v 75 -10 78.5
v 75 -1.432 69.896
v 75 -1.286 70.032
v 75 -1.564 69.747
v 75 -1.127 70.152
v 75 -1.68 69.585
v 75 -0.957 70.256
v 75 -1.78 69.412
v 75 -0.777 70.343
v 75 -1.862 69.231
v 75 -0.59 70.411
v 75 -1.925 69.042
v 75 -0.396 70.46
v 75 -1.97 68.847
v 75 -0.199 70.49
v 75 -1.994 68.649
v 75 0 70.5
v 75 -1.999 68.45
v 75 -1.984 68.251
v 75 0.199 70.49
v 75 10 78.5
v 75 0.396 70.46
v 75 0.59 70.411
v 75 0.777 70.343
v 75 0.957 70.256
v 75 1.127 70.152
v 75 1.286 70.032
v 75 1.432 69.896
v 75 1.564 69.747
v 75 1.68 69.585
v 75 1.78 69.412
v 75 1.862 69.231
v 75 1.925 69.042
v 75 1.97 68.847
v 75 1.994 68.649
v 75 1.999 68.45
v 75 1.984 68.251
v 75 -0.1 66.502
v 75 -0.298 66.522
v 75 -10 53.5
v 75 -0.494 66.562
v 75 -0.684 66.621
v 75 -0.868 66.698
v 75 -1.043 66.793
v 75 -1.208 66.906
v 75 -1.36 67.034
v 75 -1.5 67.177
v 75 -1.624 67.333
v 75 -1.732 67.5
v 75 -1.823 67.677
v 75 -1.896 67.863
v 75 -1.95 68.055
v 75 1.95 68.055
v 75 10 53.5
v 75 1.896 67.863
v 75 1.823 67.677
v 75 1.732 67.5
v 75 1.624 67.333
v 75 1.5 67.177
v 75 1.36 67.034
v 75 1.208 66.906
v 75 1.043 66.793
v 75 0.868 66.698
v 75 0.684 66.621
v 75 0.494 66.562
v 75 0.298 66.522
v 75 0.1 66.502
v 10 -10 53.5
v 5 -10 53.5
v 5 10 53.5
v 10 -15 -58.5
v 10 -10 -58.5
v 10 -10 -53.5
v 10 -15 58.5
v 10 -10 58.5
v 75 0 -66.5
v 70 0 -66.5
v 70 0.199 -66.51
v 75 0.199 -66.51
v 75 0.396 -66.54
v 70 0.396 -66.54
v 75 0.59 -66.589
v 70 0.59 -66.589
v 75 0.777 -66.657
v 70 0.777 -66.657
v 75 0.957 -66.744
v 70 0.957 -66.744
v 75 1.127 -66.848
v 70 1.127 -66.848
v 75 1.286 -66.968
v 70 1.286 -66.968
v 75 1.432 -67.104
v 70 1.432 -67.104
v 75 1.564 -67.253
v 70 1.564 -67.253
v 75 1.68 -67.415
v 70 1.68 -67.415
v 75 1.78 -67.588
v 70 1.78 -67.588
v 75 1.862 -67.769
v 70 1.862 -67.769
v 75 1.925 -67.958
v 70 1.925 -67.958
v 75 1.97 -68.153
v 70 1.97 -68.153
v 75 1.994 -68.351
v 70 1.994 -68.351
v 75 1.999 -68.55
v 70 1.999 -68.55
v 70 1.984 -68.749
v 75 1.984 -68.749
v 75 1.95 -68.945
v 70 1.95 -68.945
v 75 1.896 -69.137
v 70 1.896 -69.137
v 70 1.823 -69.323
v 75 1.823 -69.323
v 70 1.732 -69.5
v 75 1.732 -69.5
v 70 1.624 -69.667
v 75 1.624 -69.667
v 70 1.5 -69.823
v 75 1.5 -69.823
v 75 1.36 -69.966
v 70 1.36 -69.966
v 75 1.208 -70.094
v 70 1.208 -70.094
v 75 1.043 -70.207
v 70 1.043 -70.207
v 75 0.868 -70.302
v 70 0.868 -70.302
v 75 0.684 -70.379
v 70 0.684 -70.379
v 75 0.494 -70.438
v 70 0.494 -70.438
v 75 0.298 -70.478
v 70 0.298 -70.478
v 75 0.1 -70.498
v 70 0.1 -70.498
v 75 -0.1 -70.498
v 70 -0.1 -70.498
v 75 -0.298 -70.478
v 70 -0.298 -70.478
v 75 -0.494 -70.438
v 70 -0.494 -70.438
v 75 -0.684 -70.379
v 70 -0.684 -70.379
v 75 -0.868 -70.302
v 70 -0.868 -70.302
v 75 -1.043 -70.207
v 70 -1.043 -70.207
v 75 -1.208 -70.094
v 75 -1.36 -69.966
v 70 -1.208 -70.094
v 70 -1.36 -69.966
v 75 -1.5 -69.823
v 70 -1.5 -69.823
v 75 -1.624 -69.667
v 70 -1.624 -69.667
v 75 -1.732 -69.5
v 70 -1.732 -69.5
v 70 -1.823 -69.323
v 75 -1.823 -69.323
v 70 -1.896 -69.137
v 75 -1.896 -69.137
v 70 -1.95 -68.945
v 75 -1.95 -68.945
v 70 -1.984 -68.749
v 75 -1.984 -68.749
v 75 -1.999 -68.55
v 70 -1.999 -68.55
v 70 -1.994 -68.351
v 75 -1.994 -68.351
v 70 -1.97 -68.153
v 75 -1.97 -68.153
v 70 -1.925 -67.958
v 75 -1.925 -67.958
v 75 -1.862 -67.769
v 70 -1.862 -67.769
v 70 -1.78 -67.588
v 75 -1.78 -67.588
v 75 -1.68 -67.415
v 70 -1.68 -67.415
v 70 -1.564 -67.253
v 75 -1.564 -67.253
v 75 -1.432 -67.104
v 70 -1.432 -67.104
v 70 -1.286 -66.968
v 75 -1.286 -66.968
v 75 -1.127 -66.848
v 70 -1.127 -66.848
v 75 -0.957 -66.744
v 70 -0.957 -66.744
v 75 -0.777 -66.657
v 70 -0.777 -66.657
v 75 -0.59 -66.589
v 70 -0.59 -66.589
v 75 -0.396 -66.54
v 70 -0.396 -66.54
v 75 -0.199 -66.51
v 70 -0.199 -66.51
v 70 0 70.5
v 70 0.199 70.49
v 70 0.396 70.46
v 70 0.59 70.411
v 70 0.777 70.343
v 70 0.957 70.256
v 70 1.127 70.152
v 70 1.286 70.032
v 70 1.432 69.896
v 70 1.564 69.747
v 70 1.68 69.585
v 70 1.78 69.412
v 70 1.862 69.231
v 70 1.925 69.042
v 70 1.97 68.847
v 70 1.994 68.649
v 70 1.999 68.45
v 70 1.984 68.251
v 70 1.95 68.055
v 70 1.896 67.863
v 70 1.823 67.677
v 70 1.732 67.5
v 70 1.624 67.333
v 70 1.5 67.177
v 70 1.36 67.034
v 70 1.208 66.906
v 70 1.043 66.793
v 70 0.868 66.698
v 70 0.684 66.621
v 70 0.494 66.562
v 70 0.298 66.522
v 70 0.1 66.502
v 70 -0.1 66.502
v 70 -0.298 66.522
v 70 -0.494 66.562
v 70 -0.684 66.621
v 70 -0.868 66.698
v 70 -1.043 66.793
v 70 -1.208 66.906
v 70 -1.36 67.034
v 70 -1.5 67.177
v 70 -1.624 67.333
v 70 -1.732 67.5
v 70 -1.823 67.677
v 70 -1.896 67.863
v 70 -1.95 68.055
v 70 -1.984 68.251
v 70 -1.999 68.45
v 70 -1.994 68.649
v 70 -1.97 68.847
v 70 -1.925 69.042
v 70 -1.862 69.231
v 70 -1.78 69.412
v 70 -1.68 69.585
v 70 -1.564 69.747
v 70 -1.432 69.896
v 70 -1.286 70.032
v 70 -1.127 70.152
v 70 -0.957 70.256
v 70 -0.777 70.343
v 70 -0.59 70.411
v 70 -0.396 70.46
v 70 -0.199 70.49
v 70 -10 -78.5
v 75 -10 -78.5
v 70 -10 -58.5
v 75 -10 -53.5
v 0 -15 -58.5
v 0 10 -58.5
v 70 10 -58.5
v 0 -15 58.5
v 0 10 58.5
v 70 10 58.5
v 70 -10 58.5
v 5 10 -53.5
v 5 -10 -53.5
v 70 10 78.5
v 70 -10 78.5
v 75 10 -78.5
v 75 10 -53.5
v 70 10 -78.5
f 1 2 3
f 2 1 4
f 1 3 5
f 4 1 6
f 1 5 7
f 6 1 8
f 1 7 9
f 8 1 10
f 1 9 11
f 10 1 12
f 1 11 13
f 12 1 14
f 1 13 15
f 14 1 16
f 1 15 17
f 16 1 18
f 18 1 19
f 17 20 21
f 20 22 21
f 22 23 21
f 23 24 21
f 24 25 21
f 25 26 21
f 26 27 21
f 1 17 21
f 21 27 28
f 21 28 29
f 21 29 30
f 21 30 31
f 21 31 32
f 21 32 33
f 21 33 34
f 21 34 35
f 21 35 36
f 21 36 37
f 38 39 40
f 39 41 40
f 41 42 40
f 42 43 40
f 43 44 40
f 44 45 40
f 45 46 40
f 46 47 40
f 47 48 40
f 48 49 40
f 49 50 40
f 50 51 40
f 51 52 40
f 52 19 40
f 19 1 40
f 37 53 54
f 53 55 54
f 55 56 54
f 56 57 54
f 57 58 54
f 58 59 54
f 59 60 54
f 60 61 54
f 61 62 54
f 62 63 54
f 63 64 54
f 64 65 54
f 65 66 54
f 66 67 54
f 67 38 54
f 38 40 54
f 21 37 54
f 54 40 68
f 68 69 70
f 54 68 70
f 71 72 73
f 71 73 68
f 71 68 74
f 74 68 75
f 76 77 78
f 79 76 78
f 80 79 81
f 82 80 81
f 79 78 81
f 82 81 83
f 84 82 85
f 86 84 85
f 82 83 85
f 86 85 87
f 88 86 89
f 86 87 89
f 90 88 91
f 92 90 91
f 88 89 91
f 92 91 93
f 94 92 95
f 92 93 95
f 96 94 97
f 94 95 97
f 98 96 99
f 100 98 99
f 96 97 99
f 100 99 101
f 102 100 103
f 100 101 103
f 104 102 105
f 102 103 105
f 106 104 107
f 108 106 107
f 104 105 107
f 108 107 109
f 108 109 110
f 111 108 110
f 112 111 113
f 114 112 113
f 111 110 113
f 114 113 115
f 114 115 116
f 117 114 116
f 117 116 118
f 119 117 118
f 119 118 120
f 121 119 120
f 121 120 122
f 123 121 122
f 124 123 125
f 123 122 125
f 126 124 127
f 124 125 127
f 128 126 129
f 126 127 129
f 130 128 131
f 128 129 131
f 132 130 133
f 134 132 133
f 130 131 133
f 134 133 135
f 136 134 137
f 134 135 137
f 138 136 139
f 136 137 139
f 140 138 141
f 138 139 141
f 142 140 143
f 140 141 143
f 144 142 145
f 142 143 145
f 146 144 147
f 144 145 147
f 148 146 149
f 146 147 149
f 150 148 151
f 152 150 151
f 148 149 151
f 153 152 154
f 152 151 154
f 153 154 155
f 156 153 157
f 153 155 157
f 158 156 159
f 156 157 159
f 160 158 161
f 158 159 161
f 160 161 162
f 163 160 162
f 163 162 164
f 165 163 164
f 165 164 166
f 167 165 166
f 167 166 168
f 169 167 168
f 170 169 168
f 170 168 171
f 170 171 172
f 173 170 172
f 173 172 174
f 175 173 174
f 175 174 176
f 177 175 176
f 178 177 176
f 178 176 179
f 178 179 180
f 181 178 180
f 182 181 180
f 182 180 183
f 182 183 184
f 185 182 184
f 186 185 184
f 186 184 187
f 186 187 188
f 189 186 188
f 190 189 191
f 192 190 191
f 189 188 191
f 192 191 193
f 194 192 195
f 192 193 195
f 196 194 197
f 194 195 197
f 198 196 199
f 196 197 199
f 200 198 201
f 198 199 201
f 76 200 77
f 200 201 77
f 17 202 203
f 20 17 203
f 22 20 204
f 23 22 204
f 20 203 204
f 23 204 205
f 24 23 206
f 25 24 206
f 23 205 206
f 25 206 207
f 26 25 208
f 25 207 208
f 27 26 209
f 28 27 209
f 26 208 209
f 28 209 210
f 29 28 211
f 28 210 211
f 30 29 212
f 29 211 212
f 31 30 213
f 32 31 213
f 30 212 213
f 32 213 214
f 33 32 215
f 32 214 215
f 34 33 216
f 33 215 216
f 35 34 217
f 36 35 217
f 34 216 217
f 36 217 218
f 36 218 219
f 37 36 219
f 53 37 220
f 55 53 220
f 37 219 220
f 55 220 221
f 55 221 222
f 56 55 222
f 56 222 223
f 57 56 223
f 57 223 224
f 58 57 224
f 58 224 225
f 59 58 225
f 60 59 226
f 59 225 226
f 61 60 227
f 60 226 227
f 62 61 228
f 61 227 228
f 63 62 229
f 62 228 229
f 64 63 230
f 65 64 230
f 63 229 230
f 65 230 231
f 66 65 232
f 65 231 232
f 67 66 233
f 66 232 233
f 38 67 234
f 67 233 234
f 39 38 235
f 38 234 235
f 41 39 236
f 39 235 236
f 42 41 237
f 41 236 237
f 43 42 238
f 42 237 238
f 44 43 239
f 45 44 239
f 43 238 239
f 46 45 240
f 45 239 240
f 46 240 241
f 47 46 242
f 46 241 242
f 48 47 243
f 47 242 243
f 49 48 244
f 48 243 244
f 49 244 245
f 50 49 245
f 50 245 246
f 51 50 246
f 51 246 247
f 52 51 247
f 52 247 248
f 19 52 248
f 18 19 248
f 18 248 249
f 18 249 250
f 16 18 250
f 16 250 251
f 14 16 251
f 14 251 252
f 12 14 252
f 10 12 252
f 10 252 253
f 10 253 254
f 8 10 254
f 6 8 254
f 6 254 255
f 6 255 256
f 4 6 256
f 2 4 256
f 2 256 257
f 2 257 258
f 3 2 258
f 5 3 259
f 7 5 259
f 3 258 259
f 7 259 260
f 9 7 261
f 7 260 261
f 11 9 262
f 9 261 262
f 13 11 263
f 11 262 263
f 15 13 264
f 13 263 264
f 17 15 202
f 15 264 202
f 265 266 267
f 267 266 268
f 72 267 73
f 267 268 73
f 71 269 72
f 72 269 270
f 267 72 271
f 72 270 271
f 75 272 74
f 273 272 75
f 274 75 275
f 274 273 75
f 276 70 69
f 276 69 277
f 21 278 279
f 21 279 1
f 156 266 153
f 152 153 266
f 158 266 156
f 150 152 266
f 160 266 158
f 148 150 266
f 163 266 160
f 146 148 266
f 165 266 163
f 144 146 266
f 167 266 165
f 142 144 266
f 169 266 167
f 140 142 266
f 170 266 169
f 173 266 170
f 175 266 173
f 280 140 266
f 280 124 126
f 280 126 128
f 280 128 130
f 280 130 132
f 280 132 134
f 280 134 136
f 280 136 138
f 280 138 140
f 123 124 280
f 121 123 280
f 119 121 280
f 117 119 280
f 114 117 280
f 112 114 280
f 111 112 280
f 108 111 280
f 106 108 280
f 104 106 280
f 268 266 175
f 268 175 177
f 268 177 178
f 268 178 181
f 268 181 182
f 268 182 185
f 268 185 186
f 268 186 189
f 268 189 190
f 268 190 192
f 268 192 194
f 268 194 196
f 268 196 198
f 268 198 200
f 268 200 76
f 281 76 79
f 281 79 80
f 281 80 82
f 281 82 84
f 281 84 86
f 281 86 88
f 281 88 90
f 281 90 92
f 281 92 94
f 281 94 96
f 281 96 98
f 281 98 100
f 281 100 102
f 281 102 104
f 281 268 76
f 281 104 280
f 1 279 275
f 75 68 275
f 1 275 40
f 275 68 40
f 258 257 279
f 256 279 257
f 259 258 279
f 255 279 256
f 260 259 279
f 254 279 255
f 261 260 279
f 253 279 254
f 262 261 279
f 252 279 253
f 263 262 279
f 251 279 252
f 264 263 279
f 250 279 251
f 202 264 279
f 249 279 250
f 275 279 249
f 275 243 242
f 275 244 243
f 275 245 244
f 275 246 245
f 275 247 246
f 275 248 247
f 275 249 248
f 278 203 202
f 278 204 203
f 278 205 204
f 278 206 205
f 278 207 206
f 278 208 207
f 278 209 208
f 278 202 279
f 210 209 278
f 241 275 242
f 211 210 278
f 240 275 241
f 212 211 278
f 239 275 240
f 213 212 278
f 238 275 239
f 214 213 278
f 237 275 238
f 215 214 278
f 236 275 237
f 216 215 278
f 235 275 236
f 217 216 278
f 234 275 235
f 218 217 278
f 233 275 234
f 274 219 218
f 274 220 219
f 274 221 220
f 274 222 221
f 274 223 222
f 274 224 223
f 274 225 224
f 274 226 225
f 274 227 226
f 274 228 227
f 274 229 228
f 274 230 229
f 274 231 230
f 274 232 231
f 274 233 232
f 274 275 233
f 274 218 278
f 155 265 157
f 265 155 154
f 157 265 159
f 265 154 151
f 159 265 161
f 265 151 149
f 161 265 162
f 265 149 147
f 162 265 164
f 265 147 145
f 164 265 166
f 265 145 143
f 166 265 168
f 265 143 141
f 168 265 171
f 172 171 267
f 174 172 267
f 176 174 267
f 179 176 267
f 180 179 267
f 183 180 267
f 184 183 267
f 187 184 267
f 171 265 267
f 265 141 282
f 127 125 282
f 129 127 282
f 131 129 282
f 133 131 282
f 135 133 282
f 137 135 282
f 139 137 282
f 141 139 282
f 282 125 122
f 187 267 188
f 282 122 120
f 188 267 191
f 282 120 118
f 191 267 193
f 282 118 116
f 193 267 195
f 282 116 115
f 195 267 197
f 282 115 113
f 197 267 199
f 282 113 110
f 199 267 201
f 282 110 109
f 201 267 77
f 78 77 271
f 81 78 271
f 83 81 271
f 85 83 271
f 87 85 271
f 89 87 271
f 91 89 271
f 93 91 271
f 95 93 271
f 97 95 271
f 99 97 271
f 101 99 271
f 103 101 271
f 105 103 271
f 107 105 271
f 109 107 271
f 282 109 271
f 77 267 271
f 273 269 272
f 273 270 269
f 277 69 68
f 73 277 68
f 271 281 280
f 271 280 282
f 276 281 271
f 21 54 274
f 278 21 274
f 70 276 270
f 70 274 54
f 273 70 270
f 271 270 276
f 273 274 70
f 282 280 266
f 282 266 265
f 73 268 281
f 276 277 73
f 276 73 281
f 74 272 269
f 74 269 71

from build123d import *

# Parameters (mm, degrees)
SKETCH1_W           = 117
SKETCH1_H           = 20
BOSS_EXTRUDE1_DEPTH = 5
SKETCH2_W           = 5
SKETCH2_H           = 20
BOSS_EXTRUDE2_DEPTH = 70
SKETCH3_W           = 10
SKETCH3_H           = 117
BOSS_EXTRUDE3_DEPTH = 5
SKETCH4_W           = 5
SKETCH4_H           = 20
BOSS_EXTRUDE4_DEPTH = 20
SKETCH5_W           = 5
SKETCH5_H           = 20
BOSS_EXTRUDE5_DEPTH = 20
SKETCH6_R           = 2
CUT_EXTRUDE1_DEPTH  = 5


with BuildPart() as part:
    # Sketch1 → Boss-Extrude1 (new body)
    with BuildSketch(Plane(origin=(0, 0, 0), x_dir=(0, 0, -1), z_dir=(1, 0, 0))):
        Rectangle(SKETCH1_W, SKETCH1_H)
    extrude(amount=BOSS_EXTRUDE1_DEPTH)

    # Sketch2 → Boss-Extrude2 (add)
    with BuildSketch(Plane(origin=(5, 0, 0), x_dir=(0, 0, -1), z_dir=(1, 0, 0))):
        with Locations((-56, 0)):
            Rectangle(SKETCH2_W, SKETCH2_H)
        with Locations((56, 0)):
            Rectangle(SKETCH2_W, SKETCH2_H)
    extrude(amount=BOSS_EXTRUDE2_DEPTH)

    # Sketch3 → Boss-Extrude3 (add)
    with BuildSketch(Plane.XZ.offset(10)):
        with Locations((5, 0)):
            Rectangle(SKETCH3_W, SKETCH3_H)
    extrude(amount=BOSS_EXTRUDE3_DEPTH)

    # Sketch4 → Boss-Extrude4 (add)
    with BuildSketch(Plane.XY.offset(58.5)):
        with Locations((72.5, 0)):
            Rectangle(SKETCH4_W, SKETCH4_H)
    extrude(amount=BOSS_EXTRUDE4_DEPTH)

    # Sketch5 → Boss-Extrude5 (add)
    with BuildSketch(Plane(origin=(0, 0, -58.5), x_dir=(-1, 0, 0), z_dir=(0, 0, -1))):
        with Locations((-72.5, 0)):
            Rectangle(SKETCH5_W, SKETCH5_H)
    extrude(amount=BOSS_EXTRUDE5_DEPTH)

    # Sketch6 → Cut-Extrude1 (cut)
    with BuildSketch(Plane.ZY.offset(-70)):
        with Locations((-68.5, 0)):
            Circle(SKETCH6_R)
        with Locations((68.5, 0)):
            Circle(SKETCH6_R)
    extrude(amount=-CUT_EXTRUDE1_DEPTH, mode=Mode.SUBTRACT)


solid = part.part
